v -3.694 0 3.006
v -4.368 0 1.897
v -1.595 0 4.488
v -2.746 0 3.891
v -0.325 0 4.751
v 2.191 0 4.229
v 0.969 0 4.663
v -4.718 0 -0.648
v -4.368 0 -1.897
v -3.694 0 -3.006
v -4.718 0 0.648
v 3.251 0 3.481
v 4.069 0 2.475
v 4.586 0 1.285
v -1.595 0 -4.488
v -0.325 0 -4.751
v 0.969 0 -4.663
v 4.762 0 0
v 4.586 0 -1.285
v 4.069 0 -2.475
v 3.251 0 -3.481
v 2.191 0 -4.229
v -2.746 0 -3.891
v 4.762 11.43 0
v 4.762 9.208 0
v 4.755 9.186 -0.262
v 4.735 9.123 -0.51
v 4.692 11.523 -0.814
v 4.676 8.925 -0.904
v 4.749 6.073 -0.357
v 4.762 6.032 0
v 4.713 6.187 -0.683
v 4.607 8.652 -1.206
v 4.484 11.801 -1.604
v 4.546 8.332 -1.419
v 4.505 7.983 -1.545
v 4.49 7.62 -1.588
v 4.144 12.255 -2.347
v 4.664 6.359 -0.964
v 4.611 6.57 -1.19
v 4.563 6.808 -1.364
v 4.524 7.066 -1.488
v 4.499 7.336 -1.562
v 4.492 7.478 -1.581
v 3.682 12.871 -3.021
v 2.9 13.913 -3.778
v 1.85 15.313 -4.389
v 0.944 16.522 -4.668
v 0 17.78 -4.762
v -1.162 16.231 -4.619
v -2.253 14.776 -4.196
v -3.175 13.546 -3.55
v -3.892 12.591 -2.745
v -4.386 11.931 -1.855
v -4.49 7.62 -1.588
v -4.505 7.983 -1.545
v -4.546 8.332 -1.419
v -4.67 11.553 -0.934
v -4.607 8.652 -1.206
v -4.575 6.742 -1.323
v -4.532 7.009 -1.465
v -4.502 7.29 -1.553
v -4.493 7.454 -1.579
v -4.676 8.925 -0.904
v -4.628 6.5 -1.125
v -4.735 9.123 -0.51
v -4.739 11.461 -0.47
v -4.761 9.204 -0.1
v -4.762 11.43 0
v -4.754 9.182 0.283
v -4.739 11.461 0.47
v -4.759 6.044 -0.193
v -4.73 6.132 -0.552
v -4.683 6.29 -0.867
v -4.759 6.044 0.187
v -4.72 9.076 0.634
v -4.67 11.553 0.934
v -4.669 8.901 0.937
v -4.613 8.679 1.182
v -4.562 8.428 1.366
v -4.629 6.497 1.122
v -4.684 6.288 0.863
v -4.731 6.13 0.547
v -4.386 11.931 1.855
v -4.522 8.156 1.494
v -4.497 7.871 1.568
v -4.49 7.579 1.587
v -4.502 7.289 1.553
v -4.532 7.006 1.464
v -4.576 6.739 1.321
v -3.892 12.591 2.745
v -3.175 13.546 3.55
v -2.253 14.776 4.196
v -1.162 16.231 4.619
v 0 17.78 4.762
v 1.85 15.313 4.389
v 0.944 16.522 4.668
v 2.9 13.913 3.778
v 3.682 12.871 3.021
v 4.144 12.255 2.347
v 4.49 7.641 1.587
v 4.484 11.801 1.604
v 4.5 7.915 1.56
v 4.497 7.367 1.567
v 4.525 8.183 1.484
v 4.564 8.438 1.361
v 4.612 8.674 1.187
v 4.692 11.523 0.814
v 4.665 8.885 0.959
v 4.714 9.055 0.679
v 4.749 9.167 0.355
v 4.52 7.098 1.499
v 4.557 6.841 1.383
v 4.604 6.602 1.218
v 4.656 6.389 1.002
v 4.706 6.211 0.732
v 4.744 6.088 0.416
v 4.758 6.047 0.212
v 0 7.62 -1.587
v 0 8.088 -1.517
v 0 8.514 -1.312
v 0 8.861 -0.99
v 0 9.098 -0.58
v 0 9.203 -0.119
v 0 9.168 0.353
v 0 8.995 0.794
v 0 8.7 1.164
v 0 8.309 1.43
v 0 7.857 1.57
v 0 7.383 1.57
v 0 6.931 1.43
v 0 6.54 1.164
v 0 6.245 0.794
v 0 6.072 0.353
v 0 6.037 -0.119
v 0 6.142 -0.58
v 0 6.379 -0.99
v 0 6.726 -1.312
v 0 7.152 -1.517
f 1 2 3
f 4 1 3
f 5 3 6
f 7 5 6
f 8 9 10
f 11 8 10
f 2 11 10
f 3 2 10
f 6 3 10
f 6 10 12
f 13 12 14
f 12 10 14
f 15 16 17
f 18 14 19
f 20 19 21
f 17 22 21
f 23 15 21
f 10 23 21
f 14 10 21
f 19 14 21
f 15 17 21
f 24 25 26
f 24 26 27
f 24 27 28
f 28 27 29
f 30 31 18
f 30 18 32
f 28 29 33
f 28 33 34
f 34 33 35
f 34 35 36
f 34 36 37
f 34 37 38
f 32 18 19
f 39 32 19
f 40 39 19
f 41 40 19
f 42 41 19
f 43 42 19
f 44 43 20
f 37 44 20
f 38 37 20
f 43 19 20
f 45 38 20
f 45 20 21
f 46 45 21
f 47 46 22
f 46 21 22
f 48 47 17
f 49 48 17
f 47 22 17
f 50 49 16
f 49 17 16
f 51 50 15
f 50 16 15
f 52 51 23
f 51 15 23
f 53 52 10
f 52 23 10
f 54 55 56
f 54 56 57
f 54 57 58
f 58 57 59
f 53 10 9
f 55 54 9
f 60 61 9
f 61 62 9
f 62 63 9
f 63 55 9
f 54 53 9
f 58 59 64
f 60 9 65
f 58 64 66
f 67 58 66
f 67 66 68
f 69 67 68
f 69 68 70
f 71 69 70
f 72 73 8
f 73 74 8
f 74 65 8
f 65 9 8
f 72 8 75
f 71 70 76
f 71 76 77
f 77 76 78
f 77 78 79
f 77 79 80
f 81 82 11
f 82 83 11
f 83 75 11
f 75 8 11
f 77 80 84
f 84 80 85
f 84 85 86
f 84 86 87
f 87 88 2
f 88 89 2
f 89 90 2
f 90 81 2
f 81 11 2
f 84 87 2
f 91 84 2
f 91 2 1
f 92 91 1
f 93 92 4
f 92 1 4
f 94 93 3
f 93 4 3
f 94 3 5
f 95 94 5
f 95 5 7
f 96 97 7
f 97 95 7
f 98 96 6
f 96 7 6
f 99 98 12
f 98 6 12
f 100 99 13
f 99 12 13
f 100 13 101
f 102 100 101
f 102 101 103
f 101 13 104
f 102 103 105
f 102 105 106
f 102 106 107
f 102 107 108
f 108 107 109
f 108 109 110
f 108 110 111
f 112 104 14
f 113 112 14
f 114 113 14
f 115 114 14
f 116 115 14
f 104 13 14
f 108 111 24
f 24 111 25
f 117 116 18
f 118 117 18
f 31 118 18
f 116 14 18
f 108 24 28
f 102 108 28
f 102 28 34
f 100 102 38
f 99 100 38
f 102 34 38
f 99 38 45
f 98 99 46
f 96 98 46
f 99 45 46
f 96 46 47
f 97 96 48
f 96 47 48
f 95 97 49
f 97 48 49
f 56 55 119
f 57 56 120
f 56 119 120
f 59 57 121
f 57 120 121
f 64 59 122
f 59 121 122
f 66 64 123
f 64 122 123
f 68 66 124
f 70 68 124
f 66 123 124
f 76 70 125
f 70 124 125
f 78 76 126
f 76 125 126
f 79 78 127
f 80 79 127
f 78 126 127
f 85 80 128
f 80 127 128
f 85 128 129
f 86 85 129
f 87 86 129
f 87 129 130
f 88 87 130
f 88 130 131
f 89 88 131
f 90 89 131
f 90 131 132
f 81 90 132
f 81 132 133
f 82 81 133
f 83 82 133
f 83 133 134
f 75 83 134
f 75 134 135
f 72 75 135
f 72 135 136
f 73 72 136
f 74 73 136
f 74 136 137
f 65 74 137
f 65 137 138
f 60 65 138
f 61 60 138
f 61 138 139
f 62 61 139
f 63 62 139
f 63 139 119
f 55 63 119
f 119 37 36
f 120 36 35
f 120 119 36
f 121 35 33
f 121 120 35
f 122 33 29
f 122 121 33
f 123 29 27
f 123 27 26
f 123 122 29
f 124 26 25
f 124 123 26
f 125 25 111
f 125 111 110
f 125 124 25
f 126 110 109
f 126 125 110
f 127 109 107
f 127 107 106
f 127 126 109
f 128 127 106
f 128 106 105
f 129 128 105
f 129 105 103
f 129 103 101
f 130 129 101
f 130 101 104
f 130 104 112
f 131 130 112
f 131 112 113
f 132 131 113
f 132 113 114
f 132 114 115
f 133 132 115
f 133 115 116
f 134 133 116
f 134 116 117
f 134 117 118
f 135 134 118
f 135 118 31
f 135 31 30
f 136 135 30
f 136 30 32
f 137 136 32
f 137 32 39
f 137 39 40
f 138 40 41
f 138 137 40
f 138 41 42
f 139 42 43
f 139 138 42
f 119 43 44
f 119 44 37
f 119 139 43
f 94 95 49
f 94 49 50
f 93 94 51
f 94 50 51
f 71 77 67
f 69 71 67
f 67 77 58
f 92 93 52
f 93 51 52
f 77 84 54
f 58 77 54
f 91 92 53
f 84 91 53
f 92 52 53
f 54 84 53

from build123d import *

# Parameters (mm, degrees)
SKETCH1_R               = 4.7625
BOSS_EXTRUDE1_DEPTH     = 17.78
CUT_EXTRUDE1_DEPTH      = 17.78
CUT_EXTRUDE1_DEPTH_BACK = 17.78
CUT_EXTRUDE2_DEPTH      = 17.78
CUT_EXTRUDE2_DEPTH_BACK = 17.78
CUT_EXTRUDE3_DEPTH      = 17.78
CUT_EXTRUDE3_DEPTH_BACK = 17.78
SKETCH4_R               = 1.5875


with BuildPart() as part:
    # Sketch1 → Boss-Extrude1 (new body)
    with BuildSketch(Plane(origin=(0, 0, 0), x_dir=(1, 0, 0), z_dir=(0, 1, 0))):
        Circle(SKETCH1_R)
    extrude(amount=BOSS_EXTRUDE1_DEPTH)

    # Sketch2 → Cut-Extrude1 (cut, two sides: drawn at the far end of the back side and taken through both)
    with BuildSketch(Plane.XY.offset(-CUT_EXTRUDE1_DEPTH_BACK)):
        Polygon((-4.7625, 17.78), (0, 17.78), (-4.7625, 11.43), align=None)
    extrude(amount=CUT_EXTRUDE1_DEPTH + CUT_EXTRUDE1_DEPTH_BACK, mode=Mode.SUBTRACT)

    # Sketch3 → Cut-Extrude2 (cut, two sides: drawn at the far end of the back side and taken through both)
    with BuildSketch(Plane.XY.offset(-CUT_EXTRUDE2_DEPTH_BACK)):
        Polygon((0, 17.78), (4.7625, 17.78), (4.7625, 11.43), align=None)
    extrude(amount=CUT_EXTRUDE2_DEPTH + CUT_EXTRUDE2_DEPTH_BACK, mode=Mode.SUBTRACT)

    # Sketch4 → Cut-Extrude3 (cut, two sides: drawn at the far end of the back side and taken through both)
    with BuildSketch(Plane(origin=(0, 0, 0), x_dir=(0, 0, -1), z_dir=(1, 0, 0)).offset(-CUT_EXTRUDE3_DEPTH_BACK)):
        with Locations((0, 7.62)):
            Circle(SKETCH4_R)
    extrude(amount=CUT_EXTRUDE3_DEPTH + CUT_EXTRUDE3_DEPTH_BACK, mode=Mode.SUBTRACT)


solid = part.part
